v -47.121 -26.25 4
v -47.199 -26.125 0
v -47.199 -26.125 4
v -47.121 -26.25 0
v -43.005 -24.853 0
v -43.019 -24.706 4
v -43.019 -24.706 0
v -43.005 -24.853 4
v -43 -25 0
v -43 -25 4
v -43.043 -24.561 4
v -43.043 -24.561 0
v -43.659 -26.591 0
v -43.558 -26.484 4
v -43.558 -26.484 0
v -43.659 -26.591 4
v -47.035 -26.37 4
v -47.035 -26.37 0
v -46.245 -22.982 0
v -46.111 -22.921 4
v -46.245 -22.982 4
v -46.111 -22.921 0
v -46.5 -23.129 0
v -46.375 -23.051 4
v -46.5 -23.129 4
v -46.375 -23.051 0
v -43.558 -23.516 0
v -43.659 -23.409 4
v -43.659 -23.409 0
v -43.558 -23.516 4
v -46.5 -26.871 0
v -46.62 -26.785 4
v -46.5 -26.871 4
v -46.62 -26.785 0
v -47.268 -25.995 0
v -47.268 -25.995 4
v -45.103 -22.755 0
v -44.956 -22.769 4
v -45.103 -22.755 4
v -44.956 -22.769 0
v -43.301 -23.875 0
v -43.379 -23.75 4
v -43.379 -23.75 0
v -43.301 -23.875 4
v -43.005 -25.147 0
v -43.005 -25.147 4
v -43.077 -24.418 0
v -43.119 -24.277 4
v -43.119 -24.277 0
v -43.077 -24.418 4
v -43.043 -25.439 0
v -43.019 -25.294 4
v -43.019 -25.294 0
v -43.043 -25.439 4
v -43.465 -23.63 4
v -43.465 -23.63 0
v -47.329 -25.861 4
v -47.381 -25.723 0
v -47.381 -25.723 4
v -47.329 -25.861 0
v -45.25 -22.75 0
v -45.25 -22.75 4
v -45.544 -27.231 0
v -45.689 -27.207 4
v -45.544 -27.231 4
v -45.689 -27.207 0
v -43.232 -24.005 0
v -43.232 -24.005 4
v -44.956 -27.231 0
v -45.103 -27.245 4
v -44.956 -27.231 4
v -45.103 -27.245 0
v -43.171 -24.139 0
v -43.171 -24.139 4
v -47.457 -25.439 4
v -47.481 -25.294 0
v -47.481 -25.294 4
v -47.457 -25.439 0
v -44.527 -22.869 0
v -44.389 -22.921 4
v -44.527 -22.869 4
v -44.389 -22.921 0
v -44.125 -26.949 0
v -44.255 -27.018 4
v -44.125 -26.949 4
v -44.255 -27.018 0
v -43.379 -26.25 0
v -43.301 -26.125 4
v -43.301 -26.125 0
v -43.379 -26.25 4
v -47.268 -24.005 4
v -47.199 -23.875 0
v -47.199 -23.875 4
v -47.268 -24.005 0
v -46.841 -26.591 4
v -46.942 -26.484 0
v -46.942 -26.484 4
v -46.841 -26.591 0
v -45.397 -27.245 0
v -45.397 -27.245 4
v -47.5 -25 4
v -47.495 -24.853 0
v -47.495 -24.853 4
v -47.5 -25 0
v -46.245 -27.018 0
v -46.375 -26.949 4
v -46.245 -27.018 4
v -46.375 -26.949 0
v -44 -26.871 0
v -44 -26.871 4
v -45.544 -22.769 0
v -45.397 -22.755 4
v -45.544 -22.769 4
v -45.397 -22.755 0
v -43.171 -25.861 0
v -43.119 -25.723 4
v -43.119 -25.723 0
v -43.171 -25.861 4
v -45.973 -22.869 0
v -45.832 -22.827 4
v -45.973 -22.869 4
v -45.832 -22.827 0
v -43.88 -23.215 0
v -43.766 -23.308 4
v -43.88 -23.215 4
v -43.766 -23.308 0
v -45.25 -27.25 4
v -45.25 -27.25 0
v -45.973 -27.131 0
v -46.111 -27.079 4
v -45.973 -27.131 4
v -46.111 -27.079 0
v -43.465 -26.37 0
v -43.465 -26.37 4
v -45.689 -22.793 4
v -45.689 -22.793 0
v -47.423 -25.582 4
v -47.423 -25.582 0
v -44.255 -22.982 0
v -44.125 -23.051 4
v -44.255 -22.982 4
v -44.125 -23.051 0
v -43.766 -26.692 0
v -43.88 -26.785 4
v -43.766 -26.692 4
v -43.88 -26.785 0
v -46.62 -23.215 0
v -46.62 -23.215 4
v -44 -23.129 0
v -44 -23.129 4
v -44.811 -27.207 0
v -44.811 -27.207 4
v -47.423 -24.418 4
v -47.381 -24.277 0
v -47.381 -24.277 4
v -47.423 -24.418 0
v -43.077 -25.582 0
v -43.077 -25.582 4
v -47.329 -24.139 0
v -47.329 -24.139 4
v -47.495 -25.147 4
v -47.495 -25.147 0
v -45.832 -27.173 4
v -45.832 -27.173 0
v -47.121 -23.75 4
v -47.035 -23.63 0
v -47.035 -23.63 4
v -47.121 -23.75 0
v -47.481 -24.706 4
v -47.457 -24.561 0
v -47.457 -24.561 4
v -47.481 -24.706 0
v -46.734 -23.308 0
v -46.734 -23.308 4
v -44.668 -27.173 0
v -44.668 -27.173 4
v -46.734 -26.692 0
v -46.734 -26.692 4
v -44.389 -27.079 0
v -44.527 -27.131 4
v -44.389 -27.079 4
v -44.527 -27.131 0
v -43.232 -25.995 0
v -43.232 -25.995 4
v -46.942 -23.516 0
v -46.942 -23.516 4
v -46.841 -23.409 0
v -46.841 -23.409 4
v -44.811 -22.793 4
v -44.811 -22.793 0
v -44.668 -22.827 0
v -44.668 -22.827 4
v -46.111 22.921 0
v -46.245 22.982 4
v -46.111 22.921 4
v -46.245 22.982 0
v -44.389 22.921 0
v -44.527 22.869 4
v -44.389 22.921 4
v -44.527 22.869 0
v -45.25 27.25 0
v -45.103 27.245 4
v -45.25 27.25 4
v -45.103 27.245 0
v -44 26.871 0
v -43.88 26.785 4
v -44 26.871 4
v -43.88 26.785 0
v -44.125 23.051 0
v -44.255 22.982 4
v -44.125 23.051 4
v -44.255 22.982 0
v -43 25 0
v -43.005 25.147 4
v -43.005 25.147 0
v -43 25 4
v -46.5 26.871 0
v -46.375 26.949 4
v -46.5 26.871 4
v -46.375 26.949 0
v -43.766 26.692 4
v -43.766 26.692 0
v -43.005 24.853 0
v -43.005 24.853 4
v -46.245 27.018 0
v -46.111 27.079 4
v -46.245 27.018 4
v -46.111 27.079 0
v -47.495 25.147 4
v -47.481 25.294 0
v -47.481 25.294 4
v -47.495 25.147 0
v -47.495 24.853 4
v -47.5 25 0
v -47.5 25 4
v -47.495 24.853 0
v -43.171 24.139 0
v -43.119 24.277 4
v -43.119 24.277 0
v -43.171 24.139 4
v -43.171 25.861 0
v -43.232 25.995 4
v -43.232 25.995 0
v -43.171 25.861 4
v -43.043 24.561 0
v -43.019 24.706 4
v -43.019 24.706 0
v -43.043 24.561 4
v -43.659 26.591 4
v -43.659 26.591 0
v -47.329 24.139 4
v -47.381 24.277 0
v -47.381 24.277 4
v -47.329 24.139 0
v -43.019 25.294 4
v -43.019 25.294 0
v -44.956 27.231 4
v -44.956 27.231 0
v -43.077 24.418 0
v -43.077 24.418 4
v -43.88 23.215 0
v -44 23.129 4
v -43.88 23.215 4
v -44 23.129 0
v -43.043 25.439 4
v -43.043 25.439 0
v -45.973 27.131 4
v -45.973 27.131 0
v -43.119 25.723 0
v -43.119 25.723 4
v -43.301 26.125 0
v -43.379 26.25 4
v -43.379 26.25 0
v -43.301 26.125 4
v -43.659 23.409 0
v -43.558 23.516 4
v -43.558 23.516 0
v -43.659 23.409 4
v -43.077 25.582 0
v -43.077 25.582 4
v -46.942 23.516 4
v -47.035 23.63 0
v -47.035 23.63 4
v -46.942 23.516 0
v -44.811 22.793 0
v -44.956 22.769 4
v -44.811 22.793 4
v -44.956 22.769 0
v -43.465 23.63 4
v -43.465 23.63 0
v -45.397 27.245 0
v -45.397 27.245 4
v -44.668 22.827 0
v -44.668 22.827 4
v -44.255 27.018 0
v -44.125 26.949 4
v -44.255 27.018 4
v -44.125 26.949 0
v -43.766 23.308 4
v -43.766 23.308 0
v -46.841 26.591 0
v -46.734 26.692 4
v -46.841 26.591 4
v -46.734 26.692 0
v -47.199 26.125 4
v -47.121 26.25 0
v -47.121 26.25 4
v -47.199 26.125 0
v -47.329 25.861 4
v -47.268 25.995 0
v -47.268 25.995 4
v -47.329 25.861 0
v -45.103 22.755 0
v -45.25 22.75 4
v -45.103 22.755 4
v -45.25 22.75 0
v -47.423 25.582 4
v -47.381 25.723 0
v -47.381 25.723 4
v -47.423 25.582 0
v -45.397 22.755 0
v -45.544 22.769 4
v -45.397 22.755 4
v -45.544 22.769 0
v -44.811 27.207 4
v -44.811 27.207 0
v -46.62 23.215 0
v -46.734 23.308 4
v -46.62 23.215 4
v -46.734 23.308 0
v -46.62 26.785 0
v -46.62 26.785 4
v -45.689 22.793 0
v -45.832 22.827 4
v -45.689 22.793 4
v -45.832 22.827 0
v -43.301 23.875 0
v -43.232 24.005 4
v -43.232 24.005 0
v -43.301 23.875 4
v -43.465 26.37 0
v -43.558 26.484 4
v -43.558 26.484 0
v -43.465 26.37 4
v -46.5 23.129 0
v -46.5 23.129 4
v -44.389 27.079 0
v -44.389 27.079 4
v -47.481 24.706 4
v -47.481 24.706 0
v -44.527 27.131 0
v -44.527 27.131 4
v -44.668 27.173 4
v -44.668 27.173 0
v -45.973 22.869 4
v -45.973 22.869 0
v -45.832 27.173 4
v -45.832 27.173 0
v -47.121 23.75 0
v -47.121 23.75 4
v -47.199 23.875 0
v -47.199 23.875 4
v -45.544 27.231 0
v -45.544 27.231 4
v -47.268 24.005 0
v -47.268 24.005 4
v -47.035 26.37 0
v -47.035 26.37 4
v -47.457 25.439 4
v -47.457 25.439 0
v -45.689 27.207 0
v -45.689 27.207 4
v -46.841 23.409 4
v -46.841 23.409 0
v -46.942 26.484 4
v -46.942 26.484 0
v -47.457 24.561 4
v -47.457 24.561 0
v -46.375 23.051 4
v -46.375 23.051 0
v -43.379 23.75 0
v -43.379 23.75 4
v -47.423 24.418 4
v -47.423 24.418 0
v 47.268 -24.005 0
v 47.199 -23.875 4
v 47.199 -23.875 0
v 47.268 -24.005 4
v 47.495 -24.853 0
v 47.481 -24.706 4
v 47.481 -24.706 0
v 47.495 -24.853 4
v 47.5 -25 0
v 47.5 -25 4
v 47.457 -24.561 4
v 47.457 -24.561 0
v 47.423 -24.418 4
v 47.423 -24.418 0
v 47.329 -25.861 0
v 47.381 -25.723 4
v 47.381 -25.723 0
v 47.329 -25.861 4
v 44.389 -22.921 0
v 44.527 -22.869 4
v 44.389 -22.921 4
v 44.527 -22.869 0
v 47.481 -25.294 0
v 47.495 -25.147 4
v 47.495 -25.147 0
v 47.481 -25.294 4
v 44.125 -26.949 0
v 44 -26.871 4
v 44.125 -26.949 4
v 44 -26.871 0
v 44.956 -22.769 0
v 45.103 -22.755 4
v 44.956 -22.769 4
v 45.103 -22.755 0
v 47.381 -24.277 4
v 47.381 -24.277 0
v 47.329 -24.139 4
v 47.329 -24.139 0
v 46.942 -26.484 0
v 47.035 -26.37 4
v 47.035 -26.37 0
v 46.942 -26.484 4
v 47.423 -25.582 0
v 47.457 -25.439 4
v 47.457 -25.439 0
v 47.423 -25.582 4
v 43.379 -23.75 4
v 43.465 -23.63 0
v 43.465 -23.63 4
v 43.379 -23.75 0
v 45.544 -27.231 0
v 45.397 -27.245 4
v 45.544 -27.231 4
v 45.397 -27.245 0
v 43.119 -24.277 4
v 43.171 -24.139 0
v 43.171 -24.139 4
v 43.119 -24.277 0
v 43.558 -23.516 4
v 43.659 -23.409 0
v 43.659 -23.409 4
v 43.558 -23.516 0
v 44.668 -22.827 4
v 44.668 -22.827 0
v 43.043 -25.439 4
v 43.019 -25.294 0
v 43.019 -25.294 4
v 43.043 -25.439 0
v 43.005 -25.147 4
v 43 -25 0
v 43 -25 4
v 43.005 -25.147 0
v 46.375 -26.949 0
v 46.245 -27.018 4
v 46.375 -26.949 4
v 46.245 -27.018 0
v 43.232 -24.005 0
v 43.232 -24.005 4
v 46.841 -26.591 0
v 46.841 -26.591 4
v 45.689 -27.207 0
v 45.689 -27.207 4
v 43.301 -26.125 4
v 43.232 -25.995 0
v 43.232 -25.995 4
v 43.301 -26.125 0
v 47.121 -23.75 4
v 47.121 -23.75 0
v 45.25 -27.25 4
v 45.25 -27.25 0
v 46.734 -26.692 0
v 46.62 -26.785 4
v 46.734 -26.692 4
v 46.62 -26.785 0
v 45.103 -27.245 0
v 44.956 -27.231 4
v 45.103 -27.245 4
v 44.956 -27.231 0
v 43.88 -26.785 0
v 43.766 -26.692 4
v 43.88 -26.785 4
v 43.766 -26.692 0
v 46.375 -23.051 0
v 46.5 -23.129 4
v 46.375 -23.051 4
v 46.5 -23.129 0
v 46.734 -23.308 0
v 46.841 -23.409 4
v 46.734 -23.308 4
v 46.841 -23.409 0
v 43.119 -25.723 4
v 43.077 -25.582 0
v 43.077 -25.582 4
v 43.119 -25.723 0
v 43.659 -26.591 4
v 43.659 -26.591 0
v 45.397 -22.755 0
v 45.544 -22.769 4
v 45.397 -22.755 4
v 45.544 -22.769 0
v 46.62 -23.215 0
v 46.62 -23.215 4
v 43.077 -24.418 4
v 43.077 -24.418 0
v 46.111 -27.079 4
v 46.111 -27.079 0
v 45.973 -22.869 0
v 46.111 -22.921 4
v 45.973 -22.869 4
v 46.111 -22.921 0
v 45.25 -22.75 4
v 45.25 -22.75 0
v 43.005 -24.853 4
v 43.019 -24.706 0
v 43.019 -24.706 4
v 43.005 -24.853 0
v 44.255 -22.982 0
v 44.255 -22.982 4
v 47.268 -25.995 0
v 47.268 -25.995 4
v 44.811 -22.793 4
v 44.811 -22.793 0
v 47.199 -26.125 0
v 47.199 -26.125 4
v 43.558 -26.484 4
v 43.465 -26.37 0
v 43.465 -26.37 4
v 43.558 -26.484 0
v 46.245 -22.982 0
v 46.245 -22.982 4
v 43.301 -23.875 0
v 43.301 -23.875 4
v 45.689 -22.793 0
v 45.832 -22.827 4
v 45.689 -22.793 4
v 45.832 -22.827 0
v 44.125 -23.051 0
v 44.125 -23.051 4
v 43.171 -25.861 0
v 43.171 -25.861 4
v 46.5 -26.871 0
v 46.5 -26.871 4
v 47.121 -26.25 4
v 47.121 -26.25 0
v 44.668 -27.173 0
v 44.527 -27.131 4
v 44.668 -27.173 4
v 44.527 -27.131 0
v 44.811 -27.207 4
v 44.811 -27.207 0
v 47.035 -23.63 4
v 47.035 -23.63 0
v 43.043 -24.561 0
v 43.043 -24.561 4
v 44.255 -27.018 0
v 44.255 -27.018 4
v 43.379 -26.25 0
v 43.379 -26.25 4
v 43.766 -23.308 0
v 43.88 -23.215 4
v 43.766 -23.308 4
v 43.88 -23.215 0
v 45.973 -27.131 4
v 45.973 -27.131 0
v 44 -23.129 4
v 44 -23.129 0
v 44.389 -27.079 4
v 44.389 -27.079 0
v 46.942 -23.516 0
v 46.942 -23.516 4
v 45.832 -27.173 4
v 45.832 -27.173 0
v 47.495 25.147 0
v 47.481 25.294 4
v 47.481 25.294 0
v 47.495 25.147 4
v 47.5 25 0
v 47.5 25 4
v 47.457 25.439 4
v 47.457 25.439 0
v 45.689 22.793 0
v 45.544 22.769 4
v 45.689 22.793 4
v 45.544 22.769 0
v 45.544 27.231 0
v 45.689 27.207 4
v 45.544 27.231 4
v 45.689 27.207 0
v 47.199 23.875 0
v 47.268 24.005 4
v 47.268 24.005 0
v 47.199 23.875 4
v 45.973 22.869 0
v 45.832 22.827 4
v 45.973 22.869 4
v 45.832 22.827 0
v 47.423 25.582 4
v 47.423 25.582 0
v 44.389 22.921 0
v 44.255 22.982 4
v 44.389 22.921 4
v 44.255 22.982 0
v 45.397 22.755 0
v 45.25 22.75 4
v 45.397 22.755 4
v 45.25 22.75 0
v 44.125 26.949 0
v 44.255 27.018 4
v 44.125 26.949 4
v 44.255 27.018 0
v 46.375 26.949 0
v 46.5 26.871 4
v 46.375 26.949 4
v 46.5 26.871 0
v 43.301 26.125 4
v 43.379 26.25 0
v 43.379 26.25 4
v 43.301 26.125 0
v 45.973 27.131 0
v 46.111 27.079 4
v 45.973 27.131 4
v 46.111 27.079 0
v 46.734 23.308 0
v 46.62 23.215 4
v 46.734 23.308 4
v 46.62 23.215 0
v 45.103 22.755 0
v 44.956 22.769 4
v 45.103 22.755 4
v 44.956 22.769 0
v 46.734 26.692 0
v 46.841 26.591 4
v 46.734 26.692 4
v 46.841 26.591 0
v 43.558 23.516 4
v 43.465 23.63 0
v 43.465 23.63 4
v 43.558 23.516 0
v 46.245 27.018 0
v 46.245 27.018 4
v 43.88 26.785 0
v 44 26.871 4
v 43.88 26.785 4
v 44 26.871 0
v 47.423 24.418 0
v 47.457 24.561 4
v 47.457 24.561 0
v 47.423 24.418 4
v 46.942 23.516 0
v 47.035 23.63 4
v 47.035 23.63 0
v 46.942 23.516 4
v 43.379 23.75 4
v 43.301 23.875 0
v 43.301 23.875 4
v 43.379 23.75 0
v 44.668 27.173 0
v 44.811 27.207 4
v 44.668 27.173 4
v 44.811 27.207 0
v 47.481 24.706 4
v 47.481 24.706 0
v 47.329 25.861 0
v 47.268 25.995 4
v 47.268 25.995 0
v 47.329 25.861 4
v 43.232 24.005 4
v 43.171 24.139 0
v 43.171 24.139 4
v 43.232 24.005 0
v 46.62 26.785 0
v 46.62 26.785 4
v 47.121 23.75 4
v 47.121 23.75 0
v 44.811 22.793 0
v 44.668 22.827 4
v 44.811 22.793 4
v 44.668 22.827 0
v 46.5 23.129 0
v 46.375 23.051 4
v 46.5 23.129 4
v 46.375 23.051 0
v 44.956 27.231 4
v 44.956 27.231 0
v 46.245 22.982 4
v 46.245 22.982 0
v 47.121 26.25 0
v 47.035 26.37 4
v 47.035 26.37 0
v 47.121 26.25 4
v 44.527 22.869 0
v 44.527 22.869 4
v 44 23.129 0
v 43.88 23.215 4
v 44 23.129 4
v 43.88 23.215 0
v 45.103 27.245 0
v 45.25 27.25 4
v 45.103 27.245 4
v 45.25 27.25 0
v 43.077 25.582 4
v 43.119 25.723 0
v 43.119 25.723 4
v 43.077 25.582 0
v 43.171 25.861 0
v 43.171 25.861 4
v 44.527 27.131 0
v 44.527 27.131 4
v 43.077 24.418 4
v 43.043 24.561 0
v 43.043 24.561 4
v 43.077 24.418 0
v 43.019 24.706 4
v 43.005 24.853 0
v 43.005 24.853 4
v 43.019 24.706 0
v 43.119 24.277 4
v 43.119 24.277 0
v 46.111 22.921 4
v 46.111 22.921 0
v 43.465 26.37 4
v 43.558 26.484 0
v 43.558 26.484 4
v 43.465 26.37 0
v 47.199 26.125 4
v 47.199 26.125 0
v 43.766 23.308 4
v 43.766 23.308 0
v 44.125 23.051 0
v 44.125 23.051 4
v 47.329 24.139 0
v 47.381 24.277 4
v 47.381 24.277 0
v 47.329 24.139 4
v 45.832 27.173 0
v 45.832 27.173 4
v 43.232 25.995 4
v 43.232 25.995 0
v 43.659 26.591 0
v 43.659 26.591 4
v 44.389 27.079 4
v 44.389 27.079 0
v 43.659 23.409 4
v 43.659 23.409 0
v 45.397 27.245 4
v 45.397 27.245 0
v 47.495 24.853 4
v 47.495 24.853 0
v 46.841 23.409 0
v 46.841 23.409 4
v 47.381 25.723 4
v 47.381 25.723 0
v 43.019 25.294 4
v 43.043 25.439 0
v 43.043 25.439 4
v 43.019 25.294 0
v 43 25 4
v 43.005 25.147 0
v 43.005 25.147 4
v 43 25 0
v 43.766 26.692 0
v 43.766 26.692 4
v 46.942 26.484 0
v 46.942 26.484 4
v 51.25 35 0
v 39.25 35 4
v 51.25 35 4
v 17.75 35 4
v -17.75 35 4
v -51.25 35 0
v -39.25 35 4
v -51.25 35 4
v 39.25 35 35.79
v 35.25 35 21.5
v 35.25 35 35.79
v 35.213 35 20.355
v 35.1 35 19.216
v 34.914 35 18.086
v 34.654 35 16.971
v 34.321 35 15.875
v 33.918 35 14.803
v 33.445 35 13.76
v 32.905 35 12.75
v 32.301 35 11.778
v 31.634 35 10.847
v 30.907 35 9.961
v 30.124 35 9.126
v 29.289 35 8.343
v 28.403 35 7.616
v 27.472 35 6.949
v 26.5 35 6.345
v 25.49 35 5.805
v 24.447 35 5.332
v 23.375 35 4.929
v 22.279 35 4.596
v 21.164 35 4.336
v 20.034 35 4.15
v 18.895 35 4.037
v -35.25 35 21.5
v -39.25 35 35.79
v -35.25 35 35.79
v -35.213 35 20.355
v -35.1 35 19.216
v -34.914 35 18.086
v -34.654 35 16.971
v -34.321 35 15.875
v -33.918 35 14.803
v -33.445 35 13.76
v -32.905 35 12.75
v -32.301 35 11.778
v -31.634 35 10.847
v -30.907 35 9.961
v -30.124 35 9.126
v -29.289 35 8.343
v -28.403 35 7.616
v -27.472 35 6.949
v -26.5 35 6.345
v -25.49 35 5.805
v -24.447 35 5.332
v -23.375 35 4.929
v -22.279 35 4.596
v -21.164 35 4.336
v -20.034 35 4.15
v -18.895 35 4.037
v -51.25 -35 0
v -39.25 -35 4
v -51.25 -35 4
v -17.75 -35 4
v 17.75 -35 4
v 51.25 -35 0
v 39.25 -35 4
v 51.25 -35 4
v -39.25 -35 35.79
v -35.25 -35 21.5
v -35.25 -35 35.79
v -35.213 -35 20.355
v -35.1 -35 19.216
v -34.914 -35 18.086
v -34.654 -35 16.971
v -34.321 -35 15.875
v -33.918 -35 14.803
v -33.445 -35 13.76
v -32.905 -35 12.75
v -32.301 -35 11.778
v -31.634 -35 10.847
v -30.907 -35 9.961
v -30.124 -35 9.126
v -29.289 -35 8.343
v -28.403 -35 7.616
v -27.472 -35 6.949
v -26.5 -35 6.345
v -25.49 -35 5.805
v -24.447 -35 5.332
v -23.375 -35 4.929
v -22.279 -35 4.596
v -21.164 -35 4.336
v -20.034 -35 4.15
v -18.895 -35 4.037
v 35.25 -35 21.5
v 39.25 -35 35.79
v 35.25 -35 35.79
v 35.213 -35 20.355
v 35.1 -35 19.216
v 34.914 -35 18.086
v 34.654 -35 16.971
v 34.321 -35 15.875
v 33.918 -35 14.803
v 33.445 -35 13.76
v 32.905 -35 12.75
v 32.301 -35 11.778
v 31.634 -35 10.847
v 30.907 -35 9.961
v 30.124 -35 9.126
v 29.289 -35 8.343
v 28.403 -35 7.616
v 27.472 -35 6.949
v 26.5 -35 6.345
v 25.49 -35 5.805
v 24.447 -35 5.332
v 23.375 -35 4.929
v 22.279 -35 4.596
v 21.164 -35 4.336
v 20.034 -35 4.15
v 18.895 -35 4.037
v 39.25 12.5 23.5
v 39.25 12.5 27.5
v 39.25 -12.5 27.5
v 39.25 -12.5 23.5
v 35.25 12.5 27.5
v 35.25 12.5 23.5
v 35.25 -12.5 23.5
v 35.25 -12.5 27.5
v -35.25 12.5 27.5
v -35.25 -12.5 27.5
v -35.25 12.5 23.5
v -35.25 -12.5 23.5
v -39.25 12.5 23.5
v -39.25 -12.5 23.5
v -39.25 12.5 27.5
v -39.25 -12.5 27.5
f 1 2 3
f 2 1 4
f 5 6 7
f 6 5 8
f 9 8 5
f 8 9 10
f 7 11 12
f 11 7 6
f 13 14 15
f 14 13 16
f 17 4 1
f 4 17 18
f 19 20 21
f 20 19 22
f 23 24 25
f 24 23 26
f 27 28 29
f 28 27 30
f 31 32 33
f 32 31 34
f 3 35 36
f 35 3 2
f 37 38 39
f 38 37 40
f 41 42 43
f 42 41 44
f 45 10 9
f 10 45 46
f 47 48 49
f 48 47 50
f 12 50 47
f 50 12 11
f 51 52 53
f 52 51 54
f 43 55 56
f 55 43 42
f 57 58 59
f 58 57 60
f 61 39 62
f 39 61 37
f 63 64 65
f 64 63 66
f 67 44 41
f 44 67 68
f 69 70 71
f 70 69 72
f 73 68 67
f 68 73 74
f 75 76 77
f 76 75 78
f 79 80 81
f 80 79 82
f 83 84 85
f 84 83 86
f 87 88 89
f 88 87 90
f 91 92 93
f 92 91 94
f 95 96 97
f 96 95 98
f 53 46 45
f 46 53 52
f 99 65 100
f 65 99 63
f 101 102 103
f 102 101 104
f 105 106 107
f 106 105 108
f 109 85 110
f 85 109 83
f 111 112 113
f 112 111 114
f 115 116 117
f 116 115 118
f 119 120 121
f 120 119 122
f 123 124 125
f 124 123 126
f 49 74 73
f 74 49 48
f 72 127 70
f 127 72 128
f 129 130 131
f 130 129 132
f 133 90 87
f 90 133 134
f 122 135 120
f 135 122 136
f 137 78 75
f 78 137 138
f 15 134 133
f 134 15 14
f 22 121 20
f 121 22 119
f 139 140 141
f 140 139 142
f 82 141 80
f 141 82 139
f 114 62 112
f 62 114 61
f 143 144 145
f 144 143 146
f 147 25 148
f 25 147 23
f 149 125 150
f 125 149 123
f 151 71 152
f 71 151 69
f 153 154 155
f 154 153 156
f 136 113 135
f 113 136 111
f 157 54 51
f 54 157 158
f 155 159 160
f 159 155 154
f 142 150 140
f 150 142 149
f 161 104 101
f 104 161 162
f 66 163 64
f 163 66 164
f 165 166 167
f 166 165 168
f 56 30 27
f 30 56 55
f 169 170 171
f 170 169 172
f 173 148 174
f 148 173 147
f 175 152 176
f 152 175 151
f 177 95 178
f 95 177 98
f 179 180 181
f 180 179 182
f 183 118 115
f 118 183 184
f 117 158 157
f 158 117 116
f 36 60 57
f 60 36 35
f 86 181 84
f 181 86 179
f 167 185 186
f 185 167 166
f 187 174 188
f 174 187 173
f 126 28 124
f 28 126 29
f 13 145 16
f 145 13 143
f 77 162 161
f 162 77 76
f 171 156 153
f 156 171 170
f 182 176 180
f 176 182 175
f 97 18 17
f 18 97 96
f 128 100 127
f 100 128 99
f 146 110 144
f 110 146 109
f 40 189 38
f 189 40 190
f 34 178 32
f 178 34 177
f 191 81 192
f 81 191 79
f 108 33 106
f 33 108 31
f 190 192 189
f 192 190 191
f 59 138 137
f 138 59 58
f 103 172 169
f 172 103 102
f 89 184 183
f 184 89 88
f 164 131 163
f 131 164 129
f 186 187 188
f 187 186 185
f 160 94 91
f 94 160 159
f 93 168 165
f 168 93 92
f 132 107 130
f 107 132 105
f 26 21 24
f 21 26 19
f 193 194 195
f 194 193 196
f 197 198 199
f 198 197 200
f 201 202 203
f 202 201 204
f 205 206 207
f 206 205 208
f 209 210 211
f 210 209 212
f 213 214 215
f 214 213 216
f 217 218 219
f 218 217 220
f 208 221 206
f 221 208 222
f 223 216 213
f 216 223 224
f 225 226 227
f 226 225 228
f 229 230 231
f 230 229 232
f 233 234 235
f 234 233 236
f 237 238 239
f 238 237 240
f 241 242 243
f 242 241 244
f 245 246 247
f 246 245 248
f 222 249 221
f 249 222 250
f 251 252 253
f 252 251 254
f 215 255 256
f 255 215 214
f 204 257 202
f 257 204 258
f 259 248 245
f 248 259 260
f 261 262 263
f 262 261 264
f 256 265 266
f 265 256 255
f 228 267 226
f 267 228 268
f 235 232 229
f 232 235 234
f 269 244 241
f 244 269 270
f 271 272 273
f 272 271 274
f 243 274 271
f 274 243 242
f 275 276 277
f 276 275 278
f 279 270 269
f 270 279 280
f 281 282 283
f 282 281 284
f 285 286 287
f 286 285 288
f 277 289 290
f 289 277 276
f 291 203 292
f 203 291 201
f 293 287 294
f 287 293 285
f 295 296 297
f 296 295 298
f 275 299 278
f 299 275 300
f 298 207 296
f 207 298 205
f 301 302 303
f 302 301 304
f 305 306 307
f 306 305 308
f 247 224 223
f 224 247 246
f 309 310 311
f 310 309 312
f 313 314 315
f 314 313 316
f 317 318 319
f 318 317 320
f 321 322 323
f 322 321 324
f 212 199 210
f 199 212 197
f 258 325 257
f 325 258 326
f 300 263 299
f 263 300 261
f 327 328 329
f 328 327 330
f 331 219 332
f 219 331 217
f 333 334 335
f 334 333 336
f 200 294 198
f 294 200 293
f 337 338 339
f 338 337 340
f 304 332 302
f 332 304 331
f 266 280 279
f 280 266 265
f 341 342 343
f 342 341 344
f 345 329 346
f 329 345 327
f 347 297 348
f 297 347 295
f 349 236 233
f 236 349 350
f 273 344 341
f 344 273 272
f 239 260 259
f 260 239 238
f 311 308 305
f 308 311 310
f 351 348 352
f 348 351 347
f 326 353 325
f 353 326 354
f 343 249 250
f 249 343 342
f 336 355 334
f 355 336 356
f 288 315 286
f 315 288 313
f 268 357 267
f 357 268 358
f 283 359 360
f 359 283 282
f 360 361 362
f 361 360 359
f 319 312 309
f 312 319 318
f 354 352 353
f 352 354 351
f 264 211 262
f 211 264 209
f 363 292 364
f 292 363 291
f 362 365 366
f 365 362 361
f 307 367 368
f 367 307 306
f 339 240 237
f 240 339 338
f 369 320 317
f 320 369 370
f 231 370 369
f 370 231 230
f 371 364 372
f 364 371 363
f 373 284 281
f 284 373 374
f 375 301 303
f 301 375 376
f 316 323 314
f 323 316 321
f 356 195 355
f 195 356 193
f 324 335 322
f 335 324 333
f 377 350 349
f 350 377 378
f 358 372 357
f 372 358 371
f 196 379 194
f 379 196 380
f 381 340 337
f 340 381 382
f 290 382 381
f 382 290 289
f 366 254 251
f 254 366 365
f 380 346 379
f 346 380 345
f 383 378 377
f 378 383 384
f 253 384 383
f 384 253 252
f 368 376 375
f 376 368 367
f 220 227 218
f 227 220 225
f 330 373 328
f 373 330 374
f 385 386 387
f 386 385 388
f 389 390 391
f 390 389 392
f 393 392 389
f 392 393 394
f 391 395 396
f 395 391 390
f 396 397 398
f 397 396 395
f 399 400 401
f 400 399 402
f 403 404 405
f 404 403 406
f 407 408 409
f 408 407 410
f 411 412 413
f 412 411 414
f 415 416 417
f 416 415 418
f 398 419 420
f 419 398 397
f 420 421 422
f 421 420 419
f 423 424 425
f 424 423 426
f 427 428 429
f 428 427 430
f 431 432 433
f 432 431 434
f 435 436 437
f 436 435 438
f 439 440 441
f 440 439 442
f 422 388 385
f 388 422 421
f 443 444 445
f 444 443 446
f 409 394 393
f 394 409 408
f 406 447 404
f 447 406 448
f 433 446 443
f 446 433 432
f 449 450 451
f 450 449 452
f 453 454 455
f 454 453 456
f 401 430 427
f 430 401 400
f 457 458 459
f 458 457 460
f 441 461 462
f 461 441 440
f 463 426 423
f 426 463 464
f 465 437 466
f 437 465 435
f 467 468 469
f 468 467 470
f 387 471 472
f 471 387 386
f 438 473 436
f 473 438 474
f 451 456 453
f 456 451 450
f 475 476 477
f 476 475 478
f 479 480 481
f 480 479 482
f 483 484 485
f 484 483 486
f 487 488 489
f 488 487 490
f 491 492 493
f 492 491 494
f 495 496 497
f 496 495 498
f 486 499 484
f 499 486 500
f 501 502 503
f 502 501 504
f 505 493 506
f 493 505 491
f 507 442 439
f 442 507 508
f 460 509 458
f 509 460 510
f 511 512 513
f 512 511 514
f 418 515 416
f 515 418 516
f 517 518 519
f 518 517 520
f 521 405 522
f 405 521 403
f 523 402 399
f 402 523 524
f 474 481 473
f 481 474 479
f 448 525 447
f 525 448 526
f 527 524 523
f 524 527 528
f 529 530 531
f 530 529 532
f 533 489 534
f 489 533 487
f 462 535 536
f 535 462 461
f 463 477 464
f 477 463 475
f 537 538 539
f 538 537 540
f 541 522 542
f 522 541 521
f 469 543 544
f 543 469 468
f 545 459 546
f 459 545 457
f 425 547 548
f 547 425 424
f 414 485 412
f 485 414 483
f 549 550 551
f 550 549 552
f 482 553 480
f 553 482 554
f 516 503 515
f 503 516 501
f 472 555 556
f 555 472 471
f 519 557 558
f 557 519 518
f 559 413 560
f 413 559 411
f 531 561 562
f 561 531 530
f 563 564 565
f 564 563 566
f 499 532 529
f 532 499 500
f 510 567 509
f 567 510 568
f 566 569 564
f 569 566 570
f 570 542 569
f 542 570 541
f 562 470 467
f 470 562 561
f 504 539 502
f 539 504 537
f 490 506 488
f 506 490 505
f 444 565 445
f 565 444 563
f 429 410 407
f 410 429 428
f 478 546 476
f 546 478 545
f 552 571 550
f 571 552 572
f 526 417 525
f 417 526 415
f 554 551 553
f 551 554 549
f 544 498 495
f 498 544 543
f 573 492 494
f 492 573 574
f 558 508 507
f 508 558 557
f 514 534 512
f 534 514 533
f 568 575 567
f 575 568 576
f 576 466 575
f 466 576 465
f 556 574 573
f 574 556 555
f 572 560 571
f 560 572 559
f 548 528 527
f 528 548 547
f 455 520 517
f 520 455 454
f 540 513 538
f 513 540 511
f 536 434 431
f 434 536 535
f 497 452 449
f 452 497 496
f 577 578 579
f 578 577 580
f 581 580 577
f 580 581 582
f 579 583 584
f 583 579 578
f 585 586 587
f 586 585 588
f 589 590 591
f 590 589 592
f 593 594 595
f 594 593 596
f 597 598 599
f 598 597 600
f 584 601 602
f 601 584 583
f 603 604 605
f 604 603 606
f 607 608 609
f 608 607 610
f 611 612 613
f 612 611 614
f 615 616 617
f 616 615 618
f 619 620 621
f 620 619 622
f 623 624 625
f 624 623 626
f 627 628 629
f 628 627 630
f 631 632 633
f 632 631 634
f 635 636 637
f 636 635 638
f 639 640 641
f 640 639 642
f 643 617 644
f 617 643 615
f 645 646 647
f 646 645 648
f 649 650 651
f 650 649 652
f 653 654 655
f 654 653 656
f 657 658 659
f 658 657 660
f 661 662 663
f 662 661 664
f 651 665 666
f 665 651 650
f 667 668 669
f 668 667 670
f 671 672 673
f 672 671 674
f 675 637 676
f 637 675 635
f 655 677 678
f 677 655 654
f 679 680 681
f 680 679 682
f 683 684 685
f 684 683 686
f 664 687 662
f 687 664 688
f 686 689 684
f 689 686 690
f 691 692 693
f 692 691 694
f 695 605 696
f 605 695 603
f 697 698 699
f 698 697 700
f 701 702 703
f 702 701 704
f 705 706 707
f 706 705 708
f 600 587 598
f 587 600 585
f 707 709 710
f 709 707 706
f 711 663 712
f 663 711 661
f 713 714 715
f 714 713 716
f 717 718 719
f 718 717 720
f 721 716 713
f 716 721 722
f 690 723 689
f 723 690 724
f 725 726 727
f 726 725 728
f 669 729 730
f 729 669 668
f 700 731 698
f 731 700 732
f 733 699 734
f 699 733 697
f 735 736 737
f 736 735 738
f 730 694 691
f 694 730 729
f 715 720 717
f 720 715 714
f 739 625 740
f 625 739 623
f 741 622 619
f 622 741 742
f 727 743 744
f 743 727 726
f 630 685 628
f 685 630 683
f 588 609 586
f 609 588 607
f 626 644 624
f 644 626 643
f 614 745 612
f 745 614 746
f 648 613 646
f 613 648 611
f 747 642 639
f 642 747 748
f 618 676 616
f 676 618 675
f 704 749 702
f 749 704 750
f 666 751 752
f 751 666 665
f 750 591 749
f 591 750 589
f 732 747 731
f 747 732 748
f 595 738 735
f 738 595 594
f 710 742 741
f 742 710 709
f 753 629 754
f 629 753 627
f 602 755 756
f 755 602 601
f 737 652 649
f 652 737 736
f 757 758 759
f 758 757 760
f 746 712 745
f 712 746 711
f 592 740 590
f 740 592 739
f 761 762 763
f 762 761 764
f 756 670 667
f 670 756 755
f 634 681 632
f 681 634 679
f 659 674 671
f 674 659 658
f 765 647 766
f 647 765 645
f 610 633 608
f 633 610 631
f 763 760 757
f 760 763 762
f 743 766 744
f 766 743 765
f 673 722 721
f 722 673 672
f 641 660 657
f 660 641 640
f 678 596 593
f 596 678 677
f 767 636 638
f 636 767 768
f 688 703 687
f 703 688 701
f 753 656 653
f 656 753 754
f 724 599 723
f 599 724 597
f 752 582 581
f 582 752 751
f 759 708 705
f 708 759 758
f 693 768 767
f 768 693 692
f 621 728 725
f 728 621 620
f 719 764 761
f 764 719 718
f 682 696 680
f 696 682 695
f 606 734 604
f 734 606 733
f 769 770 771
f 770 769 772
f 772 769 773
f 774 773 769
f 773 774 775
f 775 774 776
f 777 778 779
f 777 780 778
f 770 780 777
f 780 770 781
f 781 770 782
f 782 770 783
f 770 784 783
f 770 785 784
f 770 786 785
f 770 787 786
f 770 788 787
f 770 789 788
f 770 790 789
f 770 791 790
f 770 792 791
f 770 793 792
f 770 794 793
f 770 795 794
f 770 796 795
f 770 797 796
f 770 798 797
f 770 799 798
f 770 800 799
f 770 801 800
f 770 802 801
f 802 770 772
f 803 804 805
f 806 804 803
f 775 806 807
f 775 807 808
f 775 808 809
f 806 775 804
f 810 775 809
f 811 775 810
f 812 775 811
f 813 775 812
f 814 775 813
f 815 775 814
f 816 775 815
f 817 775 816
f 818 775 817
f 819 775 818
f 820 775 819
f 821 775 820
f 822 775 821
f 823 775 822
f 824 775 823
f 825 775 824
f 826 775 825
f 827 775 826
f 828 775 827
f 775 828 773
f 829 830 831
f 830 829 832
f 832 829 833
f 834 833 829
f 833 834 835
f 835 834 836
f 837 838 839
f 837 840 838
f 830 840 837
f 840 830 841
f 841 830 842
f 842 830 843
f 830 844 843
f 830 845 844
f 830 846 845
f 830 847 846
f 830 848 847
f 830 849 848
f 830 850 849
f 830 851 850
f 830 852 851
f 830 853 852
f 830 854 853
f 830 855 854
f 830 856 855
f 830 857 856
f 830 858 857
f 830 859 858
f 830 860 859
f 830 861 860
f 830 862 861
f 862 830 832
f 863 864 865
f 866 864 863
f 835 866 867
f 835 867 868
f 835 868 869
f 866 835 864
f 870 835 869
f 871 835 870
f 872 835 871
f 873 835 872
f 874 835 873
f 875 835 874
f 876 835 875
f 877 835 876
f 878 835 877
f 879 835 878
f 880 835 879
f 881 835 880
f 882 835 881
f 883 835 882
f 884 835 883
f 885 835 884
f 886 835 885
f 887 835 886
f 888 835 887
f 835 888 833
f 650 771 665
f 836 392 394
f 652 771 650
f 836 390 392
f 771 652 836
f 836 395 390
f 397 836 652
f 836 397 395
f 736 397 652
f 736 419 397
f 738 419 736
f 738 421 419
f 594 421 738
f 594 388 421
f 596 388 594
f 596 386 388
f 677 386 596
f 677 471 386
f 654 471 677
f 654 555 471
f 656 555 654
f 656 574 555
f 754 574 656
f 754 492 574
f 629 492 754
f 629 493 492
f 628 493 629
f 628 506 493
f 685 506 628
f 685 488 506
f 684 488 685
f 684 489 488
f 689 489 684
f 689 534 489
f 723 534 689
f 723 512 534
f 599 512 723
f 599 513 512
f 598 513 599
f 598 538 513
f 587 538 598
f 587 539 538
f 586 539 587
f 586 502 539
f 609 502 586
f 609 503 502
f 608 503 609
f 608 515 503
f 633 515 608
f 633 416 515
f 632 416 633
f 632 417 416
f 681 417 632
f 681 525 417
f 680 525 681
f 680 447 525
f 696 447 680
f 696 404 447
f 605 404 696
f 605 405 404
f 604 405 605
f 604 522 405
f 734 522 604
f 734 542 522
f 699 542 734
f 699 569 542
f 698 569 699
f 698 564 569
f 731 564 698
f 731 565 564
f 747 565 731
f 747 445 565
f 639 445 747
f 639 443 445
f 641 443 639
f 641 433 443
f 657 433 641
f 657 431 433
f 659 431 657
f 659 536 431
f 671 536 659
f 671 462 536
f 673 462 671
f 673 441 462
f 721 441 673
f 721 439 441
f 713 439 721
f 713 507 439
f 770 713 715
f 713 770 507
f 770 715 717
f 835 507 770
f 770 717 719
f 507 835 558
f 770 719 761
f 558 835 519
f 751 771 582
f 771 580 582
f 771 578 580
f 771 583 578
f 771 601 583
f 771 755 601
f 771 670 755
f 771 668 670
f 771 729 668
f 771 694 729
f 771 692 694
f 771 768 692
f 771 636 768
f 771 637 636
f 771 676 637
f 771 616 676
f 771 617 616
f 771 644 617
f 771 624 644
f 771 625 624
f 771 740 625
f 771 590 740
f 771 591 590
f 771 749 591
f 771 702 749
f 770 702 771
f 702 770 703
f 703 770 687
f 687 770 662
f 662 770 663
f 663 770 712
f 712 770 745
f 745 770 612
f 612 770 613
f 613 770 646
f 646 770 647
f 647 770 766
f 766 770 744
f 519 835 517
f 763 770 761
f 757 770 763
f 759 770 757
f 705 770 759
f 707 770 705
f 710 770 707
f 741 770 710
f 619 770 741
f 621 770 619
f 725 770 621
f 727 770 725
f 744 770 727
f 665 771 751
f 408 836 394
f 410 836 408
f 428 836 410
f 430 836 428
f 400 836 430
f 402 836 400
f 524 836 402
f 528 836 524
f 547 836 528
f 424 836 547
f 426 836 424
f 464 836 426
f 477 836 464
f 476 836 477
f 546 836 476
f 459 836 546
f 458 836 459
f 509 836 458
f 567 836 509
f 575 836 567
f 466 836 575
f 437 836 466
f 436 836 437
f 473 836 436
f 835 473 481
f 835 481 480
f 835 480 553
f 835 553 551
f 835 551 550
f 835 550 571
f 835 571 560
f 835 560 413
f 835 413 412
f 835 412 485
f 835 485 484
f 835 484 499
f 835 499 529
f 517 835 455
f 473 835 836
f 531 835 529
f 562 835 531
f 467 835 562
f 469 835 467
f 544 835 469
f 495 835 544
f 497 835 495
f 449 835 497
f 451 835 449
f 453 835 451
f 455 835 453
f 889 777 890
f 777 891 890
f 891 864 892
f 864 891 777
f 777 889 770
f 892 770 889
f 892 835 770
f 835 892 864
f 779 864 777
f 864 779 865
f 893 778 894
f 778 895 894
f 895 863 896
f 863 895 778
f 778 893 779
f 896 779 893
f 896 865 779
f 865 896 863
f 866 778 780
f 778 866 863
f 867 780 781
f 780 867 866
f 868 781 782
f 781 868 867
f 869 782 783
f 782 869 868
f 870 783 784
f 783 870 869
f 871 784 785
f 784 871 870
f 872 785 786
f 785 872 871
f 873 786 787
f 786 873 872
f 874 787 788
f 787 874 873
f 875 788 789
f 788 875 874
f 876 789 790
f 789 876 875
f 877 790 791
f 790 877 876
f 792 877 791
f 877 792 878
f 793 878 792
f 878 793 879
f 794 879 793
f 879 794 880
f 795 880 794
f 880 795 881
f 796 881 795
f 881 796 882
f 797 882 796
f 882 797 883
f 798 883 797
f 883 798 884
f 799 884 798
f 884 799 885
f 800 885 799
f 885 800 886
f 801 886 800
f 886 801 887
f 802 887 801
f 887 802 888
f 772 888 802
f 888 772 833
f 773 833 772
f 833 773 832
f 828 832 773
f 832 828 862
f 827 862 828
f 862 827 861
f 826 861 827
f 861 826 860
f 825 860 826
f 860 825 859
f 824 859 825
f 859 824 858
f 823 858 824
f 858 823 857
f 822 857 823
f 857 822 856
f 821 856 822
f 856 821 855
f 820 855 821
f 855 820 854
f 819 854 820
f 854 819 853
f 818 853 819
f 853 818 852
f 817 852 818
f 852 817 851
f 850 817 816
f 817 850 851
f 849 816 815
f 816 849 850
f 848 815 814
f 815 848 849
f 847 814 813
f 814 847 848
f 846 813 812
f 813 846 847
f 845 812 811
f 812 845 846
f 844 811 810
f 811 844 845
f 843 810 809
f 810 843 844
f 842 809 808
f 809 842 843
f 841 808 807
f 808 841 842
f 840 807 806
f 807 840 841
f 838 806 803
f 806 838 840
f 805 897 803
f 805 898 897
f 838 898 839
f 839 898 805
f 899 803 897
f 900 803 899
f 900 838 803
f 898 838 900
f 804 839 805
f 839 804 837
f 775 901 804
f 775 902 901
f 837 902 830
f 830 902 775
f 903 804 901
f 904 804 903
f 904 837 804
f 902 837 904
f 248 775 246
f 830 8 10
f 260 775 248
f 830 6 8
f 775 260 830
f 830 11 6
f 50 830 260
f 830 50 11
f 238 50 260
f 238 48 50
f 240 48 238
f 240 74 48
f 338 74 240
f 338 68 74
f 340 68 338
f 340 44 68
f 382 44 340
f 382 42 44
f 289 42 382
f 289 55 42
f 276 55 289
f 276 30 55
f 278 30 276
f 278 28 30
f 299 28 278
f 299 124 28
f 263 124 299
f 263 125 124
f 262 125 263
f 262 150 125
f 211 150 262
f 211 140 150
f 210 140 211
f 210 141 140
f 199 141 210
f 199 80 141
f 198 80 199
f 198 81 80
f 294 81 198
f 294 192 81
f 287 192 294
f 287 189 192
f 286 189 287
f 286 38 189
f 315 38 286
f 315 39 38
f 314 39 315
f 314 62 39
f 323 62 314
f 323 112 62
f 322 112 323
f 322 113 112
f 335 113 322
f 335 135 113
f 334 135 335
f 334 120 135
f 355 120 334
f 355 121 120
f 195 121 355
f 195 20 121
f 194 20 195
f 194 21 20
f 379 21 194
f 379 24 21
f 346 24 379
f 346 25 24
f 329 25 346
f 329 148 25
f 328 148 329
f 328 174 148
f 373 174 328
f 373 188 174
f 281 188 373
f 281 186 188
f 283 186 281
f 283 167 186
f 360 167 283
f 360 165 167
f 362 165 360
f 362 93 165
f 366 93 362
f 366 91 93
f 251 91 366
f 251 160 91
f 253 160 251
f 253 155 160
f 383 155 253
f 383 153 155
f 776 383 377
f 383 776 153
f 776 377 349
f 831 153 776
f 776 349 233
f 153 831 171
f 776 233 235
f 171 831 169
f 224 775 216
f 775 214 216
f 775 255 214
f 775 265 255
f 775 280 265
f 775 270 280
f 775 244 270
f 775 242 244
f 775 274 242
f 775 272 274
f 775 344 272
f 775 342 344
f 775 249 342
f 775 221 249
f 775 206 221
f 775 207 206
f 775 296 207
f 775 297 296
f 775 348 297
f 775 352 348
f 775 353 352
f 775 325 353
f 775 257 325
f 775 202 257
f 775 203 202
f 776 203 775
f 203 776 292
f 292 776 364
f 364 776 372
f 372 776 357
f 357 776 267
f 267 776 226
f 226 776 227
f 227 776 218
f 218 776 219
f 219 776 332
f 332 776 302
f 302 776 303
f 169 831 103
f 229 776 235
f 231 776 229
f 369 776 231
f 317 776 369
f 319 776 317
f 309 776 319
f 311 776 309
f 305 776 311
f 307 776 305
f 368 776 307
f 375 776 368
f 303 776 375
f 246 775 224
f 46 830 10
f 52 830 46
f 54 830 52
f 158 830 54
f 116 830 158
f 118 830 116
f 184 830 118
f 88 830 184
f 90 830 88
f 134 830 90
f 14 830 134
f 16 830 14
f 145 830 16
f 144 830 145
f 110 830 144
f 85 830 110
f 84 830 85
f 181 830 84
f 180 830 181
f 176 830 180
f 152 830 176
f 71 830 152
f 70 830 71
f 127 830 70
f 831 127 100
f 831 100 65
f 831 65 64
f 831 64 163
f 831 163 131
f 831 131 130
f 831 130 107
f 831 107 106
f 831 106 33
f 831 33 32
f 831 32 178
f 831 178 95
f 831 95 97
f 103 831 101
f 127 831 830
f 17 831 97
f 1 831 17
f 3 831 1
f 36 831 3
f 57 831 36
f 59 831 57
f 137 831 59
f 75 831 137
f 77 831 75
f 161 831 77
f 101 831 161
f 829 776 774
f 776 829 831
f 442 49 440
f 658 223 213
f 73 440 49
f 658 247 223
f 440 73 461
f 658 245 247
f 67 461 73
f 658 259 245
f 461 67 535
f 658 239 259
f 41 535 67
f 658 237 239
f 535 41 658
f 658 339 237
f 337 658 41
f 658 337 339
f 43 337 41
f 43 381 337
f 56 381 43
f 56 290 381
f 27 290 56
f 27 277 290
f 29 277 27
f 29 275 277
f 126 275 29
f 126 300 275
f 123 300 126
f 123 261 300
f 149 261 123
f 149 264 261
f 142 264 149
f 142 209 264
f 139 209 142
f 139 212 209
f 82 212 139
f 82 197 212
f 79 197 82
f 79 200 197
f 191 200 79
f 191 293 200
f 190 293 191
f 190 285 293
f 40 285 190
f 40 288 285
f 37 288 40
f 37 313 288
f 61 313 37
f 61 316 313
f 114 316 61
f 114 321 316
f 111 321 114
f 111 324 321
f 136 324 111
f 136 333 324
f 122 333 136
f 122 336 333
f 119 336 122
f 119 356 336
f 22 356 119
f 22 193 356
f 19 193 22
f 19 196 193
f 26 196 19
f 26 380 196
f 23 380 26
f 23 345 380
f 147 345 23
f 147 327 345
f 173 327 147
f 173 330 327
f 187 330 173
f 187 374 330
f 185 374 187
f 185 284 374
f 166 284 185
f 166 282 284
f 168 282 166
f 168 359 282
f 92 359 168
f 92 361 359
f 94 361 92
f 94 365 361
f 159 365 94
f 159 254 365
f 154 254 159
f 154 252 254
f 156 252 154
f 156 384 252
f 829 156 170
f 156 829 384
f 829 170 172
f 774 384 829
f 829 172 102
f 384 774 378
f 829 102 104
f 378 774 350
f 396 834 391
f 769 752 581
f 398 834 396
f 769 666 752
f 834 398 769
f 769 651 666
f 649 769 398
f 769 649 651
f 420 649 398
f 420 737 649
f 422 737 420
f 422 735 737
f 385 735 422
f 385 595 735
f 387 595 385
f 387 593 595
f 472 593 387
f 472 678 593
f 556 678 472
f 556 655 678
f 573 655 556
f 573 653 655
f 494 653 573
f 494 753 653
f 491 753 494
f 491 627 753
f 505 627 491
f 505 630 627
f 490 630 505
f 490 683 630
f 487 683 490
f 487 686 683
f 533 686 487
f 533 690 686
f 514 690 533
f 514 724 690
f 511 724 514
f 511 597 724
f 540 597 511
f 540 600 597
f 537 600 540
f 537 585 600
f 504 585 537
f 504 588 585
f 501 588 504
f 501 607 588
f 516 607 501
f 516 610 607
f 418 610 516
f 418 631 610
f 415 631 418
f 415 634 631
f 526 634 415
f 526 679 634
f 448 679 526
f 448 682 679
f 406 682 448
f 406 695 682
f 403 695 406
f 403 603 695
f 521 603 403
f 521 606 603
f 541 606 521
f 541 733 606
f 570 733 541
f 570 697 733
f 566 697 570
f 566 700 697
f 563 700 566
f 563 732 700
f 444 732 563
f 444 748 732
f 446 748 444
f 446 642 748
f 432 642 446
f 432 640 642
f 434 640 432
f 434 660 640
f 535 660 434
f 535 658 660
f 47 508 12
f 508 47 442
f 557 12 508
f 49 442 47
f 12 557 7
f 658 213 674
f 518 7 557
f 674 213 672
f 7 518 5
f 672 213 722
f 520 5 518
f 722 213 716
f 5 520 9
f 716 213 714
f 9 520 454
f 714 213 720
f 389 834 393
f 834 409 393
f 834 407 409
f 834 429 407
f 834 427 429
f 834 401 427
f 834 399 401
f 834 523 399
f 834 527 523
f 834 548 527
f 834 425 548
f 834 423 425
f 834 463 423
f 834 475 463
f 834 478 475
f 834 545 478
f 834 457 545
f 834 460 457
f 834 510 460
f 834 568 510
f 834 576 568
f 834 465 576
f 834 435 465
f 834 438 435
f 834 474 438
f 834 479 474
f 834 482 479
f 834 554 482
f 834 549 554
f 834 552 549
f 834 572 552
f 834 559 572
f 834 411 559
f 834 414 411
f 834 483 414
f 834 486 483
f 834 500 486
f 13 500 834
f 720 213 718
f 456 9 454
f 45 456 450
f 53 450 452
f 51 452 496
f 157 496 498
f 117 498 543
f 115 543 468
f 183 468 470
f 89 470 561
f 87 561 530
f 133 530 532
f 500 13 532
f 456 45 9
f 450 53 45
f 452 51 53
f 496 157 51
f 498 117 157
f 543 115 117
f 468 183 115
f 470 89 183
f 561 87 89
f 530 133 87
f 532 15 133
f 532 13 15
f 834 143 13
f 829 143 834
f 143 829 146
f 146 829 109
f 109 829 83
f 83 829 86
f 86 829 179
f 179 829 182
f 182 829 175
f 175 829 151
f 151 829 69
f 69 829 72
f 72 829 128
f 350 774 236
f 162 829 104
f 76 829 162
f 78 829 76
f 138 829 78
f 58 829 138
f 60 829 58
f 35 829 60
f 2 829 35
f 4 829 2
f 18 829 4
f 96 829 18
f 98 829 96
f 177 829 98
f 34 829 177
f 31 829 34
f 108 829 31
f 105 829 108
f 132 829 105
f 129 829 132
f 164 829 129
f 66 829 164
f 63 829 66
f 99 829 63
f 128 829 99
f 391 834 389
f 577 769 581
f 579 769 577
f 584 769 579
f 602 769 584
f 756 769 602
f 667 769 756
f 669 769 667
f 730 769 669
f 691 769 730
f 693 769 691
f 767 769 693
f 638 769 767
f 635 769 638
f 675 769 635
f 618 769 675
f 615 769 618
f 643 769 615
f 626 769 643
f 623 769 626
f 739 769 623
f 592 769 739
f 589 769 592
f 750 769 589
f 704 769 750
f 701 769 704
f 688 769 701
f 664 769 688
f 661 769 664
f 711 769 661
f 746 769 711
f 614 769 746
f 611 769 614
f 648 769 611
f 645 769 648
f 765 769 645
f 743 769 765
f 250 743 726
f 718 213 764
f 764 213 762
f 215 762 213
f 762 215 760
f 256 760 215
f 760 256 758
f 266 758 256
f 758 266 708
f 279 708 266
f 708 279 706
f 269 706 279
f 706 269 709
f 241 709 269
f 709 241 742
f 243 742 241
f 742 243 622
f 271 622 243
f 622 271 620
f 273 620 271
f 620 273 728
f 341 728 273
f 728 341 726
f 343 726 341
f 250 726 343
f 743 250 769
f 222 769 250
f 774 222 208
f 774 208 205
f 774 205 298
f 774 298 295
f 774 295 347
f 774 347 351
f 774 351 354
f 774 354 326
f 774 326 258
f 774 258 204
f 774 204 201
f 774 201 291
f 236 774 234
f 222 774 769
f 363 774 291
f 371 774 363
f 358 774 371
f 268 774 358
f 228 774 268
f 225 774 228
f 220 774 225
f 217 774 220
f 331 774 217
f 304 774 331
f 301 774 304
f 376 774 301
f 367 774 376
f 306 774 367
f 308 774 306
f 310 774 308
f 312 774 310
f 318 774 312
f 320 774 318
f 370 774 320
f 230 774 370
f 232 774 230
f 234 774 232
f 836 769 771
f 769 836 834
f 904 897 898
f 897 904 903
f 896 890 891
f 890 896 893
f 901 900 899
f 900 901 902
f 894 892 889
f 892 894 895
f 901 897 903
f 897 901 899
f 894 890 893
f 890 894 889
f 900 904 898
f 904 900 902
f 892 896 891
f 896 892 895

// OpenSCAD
// Test cradle for a sewing-machine motor (Matsushita SC-L1 class)
// Written by Claude at Bob Drzyzgula's direction, 2026-10-19.
//
// A foam-lined saddle that holds the motor body still on the bench for
// characterization runs. It wraps the lower part of the body only, so both
// end bells (fan vents, pulley, cord grommet) stay clear and the pulley end
// is open for a laser tach. A strap slot through both cheeks takes a
// hook-and-loop strap over the top: the motor's reaction torque at start-up
// would otherwise roll it in a rounded, foam-lined cradle.
//
// Units: mm. Plain OpenSCAD, no libraries.
// Print flat on its base, no supports needed. PETG or PLA.

/* [Motor body] */
// Body width across (the face that sits down), mm
motor_w = 63.5;   // 2.5 in
// Body height, mm
motor_h = 50.8;   // 2.0 in
// Corner radius of the body's cross-section, mm (measure; ~12-16 by photo)
corner_r = 14;

/* [Cradle] */
// Foam liner thickness (compressed), mm
foam_t = 3;
// Extra clearance around foam, mm
clear = 0.5;
// Cradle length along the motor, mm (body is ~114; keep the end bells free)
cradle_len = 70;
// How far up the body the cheeks reach, as a fraction of motor height
wrap = 0.55;
// Wall thickness of the cheeks and floor, mm
wall = 4;
// Floor thickness under the lowest point of the motor, mm
floor_t = 4;
// Extra base width each side for stability, mm
flange = 12;
// Base flange thickness, mm
flange_t = 4;

/* [Strap slot] */
// Strap width (hook-and-loop), mm
strap_w = 25;
// Slot height, mm
strap_slot_h = 4;

/* [Bench screws] */
// Hole diameter in the flanges for clamping to a board (0 = none)
screw_d = 4.5;

$fn = 96;

eps = 0.01;
in_w = motor_w + 2 * (foam_t + clear);
in_h = motor_h + 2 * (foam_t + clear);
in_r = corner_r + foam_t + clear;
out_w = in_w + 2 * wall;
cheek_h = floor_t + wrap * in_h;      // top of the cheeks above the base
base_w = out_w + 2 * flange;

// Rounded rectangle centred on the origin, in XY
module rrect(w, h, r) {
    offset(r = r) square([w - 2 * r, h - 2 * r], center = true);
}

// Cross-section of the cradle (X across, Y up), base at Y = 0
module section() {
    difference() {
        union() {
            // body around the motor, cut flat at cheek height
            intersection() {
                translate([0, floor_t + in_h / 2]) rrect(out_w, in_h + 2 * wall, in_r + wall);
                translate([-out_w / 2, 0]) square([out_w, cheek_h]);
            }
            // fill under the rounded corners down to the base
            translate([-out_w / 2, 0]) square([out_w, floor_t + in_r]);
            // flanges
            translate([-base_w / 2, 0]) square([base_w, flange_t]);
        }
        // the foam-lined pocket
        translate([0, floor_t + in_h / 2]) rrect(in_w, in_h, in_r);
    }
}

module cradle() {
    difference() {
        // extrude the section along the motor axis (Y in the final part)
        rotate([90, 0, 0]) linear_extrude(cradle_len, center = true) section();

        // strap slot straight through both cheeks, centred on the length
        translate([0, 0, floor_t + in_r + strap_slot_h / 2 + 2])
            cube([out_w + 2, strap_w, strap_slot_h], center = true);

        // bench screw holes, two per flange
        if (screw_d > 0)
            for (sx = [-1, 1], sy = [-1, 1])
                translate([sx * (out_w / 2 + flange / 2), sy * (cradle_len / 2 - 10), -eps])
                    cylinder(d = screw_d, h = flange_t + 2 * eps);
    }
}

cradle();

echo(str("Cradle footprint ", base_w, " x ", cradle_len, " mm, height ", cheek_h, " mm"));
